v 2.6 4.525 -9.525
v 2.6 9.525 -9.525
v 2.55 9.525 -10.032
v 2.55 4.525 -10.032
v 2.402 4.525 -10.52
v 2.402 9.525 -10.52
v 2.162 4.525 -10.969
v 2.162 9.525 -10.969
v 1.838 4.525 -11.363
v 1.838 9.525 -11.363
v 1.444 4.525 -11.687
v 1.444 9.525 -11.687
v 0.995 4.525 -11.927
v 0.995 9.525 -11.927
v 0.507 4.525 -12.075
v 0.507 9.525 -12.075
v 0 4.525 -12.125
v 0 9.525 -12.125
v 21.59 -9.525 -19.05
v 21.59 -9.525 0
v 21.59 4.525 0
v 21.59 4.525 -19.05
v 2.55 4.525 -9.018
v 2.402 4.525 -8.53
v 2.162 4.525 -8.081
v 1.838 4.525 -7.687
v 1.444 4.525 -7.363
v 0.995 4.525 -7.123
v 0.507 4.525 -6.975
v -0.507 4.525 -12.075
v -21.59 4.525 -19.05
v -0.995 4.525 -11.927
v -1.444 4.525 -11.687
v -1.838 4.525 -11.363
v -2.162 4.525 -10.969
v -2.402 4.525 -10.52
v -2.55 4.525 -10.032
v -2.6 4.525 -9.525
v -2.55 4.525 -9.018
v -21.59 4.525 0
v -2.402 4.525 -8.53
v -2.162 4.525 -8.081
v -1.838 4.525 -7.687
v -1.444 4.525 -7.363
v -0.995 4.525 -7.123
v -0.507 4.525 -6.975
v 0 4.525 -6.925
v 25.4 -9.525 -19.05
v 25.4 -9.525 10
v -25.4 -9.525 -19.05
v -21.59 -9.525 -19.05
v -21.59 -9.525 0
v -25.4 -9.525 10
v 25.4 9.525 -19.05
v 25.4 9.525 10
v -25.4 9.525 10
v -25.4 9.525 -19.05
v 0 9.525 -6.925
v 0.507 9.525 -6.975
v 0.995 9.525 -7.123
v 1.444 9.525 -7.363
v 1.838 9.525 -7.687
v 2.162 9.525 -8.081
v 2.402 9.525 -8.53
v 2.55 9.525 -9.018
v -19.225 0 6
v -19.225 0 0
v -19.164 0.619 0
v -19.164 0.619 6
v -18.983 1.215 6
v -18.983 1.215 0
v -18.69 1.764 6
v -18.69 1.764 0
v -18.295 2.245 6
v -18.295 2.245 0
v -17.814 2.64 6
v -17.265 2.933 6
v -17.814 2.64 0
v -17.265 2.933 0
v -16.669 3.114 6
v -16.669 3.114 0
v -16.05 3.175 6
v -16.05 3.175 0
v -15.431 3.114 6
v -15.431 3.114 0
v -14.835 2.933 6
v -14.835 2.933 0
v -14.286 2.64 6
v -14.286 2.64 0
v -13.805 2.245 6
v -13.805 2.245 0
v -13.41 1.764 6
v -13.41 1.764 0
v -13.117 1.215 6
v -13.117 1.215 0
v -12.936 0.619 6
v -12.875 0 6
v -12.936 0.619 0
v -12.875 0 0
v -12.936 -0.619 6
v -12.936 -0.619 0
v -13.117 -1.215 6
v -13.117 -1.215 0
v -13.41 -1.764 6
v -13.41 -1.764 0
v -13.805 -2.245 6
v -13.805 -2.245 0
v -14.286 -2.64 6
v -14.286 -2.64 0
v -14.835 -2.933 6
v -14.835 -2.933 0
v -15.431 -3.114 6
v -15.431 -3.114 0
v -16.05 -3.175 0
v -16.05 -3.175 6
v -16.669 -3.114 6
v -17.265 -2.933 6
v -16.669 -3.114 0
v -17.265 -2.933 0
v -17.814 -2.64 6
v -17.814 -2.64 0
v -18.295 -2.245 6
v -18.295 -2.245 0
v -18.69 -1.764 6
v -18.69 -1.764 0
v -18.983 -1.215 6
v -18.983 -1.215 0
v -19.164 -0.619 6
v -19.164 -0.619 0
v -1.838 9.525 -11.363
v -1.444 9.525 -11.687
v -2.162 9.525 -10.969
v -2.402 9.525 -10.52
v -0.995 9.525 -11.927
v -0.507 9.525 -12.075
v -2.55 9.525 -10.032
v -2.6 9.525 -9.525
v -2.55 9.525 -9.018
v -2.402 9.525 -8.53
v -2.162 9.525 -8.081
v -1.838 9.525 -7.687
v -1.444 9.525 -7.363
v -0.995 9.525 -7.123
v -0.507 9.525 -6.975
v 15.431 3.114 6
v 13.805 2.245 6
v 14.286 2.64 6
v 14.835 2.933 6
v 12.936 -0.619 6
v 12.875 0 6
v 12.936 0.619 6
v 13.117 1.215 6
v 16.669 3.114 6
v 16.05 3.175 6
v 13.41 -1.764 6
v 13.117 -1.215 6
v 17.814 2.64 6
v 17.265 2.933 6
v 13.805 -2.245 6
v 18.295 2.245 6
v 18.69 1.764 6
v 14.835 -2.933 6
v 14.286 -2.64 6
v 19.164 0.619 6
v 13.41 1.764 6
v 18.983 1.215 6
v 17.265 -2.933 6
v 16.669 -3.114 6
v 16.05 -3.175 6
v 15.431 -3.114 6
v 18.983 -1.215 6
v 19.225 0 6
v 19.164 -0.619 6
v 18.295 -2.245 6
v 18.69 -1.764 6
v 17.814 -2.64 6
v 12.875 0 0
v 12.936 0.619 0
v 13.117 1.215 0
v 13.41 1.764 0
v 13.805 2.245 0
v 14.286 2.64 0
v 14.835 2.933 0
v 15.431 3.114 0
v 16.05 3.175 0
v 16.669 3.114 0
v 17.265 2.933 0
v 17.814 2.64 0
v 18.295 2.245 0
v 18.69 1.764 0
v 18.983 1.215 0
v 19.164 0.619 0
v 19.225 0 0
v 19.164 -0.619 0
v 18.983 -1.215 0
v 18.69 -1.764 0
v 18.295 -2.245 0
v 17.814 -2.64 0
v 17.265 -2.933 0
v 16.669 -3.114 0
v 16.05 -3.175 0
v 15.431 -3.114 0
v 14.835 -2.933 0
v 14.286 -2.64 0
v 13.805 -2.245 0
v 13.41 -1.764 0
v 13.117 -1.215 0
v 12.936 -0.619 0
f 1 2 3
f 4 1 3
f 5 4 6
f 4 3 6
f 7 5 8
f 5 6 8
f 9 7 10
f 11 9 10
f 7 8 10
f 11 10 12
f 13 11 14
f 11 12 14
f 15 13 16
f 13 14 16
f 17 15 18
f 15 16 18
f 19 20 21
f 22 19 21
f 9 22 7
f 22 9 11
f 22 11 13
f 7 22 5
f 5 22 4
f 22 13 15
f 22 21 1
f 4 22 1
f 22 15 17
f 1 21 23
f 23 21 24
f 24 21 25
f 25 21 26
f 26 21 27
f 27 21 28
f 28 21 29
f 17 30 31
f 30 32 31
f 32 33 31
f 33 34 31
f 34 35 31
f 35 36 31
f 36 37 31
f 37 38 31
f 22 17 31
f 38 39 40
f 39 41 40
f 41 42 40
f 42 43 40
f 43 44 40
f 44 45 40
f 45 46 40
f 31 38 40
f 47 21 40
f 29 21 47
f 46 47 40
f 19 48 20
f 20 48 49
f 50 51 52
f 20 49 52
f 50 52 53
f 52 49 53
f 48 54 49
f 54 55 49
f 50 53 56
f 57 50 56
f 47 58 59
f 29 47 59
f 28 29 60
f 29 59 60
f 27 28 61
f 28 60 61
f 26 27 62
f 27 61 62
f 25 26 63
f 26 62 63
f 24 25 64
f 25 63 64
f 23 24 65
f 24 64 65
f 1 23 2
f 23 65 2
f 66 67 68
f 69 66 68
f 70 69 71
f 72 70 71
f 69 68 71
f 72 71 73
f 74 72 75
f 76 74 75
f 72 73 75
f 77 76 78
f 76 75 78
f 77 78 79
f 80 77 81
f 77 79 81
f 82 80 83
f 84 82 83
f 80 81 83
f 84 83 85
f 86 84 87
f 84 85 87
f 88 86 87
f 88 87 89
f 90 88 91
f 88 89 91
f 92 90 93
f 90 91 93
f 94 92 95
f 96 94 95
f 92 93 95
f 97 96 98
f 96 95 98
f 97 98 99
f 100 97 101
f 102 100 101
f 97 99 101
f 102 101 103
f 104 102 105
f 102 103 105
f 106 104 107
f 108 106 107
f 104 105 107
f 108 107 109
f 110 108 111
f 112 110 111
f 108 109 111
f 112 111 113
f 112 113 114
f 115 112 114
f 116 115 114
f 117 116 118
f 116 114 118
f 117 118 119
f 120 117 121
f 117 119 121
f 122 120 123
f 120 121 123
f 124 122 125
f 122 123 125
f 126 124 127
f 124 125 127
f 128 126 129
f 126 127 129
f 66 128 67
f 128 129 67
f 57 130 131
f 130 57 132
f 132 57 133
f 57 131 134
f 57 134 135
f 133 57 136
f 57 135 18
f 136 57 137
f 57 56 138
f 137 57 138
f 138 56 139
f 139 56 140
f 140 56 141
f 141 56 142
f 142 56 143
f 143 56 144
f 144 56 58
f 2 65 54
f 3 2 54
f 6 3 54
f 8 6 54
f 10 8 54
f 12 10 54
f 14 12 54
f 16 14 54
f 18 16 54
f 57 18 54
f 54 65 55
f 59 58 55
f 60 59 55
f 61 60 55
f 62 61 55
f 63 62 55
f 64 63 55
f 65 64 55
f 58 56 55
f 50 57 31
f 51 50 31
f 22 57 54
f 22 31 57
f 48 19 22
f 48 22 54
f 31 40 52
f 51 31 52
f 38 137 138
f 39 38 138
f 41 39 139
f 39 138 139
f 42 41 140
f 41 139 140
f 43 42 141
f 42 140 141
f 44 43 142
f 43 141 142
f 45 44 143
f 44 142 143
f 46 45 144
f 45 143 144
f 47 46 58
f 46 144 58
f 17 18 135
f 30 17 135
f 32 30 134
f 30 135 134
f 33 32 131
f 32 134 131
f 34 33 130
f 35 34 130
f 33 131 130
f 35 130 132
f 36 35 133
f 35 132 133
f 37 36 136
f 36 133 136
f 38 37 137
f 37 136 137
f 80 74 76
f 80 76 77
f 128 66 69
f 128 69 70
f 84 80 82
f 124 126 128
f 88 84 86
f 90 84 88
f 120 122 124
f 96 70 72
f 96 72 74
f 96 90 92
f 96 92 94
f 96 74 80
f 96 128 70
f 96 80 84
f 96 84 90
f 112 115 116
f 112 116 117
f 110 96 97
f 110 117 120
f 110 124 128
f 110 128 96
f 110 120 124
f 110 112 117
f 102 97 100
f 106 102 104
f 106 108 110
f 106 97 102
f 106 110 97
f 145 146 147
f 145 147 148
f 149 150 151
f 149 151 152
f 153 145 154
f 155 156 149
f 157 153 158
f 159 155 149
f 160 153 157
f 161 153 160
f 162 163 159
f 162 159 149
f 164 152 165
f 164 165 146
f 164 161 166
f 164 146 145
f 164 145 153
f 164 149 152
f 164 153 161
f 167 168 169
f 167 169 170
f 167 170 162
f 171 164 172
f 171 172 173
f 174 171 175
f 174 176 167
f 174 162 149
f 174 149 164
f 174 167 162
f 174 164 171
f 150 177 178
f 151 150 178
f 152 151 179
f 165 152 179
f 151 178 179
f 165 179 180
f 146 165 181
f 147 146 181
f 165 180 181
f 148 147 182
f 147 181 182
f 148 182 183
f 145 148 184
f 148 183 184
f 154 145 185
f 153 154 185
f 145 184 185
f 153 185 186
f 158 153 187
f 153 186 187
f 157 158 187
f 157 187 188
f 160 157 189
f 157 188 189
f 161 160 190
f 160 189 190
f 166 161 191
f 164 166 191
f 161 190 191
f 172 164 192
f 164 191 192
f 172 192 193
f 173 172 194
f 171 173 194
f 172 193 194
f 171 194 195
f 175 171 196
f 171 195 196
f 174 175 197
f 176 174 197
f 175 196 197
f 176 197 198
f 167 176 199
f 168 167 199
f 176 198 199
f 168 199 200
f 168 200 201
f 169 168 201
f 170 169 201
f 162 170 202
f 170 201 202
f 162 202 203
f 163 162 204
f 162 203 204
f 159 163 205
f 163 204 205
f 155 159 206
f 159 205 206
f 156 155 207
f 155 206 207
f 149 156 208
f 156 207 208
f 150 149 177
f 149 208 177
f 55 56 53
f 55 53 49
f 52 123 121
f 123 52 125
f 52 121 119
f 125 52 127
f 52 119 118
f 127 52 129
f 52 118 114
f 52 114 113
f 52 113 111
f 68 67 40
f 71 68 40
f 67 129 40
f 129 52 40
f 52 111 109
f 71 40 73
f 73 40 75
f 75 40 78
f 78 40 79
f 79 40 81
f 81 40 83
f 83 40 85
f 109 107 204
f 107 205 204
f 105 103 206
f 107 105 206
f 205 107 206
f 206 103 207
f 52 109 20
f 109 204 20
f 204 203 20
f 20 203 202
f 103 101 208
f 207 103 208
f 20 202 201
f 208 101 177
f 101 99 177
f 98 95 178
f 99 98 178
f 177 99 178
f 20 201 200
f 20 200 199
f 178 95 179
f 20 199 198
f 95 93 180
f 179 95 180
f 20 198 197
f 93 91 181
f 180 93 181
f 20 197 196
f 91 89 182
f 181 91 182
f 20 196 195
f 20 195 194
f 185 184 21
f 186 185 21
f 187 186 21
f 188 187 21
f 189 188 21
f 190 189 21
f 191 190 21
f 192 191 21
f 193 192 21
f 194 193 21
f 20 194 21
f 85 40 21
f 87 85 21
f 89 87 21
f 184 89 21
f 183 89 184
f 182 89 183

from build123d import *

# Parameters (mm, degrees)
F0_W     = 50.8
F0_H     = 19.05
F1_DEPTH = 10
F3_DEPTH = 6
F5_DEPTH = 19.05
F7_DEPTH = 5


with BuildPart() as f1:
    # F0 (on Top) → F1 (new body)
    with BuildSketch(Plane.XY):
        Rectangle(F0_W, F0_H)
    extrude(amount=F1_DEPTH)

    # F2 (on face) → F3 (cut)
    with BuildSketch(Plane(origin=(0, 0, 0), x_dir=(1, 0, 0), z_dir=(0, 0, -1))):
        with BuildLine():
            ThreePointArc((-12.875006, 0), (-16.050006, 3.175), (-19.225006, 0))
            Line((-19.225006, 0), (-12.875006, 0))
        make_face()
        with BuildLine():
            ThreePointArc((19.225006, 0), (16.050006, 3.175), (12.875006, 0))
            Line((12.875006, 0), (19.225006, 0))
        make_face()
        with BuildLine():
            Line((19.225006, 0), (12.875006, 0))
            ThreePointArc((12.875006, 0), (16.050006, -3.175), (19.225006, 0))
        make_face()
        with BuildLine():
            Line((-12.875006, 0), (-19.225006, 0))
            ThreePointArc((-19.225006, 0), (-16.050006, -3.175), (-12.875006, 0))
        make_face()
    extrude(amount=-F3_DEPTH, mode=Mode.SUBTRACT)

    # F4 (on face) → F5 (join)
    with BuildSketch(Plane(origin=(0, 0, 0), x_dir=(1, 0, 0), z_dir=(0, 0, -1))):
        Polygon((-25.4, -4.525), (-25.4, -9.525), (-2.5, -9.525), (2.5, -9.525), (25.4, -9.525), (25.4, -4.525), (25.4, 9.525), (21.59, 9.525), (21.59, -4.525), (-2.5, -4.525), (-21.59, -4.525), (-21.59, 9.525), (-25.4, 9.525), align=None)
    extrude(amount=F5_DEPTH)

    # F6 (on face) → F7 (cut, through all)
    with BuildSketch(Plane(origin=(0, 9.525, 0), x_dir=(-1, 0, 0), z_dir=(0, 1, 0))):
        with BuildLine():
            Line((0, -9.525), (2.6, -9.525))
            ThreePointArc((2.6, -9.525), (1.838478, -7.686522), (0, -6.925))
            Line((0, -6.925), (0, -9.525))
        make_face()
        with BuildLine():
            ThreePointArc((0, -12.125), (1.838478, -11.363478), (2.6, -9.525))
            Line((2.6, -9.525), (0, -9.525))
            Line((0, -9.525), (0, -12.125))
        make_face()
        with BuildLine():
            Line((0, -9.525), (0, -6.925))
            ThreePointArc((0, -6.925), (-1.838478, -7.686522), (-2.6, -9.525))
            Line((-2.6, -9.525), (0, -9.525))
        make_face()
        with BuildLine():
            ThreePointArc((-2.6, -9.525), (-1.838478, -11.363478), (0, -12.125))
            Line((0, -12.125), (0, -9.525))
            Line((0, -9.525), (-2.6, -9.525))
        make_face()
    extrude(amount=-F7_DEPTH, mode=Mode.SUBTRACT)


solid = f1.part
